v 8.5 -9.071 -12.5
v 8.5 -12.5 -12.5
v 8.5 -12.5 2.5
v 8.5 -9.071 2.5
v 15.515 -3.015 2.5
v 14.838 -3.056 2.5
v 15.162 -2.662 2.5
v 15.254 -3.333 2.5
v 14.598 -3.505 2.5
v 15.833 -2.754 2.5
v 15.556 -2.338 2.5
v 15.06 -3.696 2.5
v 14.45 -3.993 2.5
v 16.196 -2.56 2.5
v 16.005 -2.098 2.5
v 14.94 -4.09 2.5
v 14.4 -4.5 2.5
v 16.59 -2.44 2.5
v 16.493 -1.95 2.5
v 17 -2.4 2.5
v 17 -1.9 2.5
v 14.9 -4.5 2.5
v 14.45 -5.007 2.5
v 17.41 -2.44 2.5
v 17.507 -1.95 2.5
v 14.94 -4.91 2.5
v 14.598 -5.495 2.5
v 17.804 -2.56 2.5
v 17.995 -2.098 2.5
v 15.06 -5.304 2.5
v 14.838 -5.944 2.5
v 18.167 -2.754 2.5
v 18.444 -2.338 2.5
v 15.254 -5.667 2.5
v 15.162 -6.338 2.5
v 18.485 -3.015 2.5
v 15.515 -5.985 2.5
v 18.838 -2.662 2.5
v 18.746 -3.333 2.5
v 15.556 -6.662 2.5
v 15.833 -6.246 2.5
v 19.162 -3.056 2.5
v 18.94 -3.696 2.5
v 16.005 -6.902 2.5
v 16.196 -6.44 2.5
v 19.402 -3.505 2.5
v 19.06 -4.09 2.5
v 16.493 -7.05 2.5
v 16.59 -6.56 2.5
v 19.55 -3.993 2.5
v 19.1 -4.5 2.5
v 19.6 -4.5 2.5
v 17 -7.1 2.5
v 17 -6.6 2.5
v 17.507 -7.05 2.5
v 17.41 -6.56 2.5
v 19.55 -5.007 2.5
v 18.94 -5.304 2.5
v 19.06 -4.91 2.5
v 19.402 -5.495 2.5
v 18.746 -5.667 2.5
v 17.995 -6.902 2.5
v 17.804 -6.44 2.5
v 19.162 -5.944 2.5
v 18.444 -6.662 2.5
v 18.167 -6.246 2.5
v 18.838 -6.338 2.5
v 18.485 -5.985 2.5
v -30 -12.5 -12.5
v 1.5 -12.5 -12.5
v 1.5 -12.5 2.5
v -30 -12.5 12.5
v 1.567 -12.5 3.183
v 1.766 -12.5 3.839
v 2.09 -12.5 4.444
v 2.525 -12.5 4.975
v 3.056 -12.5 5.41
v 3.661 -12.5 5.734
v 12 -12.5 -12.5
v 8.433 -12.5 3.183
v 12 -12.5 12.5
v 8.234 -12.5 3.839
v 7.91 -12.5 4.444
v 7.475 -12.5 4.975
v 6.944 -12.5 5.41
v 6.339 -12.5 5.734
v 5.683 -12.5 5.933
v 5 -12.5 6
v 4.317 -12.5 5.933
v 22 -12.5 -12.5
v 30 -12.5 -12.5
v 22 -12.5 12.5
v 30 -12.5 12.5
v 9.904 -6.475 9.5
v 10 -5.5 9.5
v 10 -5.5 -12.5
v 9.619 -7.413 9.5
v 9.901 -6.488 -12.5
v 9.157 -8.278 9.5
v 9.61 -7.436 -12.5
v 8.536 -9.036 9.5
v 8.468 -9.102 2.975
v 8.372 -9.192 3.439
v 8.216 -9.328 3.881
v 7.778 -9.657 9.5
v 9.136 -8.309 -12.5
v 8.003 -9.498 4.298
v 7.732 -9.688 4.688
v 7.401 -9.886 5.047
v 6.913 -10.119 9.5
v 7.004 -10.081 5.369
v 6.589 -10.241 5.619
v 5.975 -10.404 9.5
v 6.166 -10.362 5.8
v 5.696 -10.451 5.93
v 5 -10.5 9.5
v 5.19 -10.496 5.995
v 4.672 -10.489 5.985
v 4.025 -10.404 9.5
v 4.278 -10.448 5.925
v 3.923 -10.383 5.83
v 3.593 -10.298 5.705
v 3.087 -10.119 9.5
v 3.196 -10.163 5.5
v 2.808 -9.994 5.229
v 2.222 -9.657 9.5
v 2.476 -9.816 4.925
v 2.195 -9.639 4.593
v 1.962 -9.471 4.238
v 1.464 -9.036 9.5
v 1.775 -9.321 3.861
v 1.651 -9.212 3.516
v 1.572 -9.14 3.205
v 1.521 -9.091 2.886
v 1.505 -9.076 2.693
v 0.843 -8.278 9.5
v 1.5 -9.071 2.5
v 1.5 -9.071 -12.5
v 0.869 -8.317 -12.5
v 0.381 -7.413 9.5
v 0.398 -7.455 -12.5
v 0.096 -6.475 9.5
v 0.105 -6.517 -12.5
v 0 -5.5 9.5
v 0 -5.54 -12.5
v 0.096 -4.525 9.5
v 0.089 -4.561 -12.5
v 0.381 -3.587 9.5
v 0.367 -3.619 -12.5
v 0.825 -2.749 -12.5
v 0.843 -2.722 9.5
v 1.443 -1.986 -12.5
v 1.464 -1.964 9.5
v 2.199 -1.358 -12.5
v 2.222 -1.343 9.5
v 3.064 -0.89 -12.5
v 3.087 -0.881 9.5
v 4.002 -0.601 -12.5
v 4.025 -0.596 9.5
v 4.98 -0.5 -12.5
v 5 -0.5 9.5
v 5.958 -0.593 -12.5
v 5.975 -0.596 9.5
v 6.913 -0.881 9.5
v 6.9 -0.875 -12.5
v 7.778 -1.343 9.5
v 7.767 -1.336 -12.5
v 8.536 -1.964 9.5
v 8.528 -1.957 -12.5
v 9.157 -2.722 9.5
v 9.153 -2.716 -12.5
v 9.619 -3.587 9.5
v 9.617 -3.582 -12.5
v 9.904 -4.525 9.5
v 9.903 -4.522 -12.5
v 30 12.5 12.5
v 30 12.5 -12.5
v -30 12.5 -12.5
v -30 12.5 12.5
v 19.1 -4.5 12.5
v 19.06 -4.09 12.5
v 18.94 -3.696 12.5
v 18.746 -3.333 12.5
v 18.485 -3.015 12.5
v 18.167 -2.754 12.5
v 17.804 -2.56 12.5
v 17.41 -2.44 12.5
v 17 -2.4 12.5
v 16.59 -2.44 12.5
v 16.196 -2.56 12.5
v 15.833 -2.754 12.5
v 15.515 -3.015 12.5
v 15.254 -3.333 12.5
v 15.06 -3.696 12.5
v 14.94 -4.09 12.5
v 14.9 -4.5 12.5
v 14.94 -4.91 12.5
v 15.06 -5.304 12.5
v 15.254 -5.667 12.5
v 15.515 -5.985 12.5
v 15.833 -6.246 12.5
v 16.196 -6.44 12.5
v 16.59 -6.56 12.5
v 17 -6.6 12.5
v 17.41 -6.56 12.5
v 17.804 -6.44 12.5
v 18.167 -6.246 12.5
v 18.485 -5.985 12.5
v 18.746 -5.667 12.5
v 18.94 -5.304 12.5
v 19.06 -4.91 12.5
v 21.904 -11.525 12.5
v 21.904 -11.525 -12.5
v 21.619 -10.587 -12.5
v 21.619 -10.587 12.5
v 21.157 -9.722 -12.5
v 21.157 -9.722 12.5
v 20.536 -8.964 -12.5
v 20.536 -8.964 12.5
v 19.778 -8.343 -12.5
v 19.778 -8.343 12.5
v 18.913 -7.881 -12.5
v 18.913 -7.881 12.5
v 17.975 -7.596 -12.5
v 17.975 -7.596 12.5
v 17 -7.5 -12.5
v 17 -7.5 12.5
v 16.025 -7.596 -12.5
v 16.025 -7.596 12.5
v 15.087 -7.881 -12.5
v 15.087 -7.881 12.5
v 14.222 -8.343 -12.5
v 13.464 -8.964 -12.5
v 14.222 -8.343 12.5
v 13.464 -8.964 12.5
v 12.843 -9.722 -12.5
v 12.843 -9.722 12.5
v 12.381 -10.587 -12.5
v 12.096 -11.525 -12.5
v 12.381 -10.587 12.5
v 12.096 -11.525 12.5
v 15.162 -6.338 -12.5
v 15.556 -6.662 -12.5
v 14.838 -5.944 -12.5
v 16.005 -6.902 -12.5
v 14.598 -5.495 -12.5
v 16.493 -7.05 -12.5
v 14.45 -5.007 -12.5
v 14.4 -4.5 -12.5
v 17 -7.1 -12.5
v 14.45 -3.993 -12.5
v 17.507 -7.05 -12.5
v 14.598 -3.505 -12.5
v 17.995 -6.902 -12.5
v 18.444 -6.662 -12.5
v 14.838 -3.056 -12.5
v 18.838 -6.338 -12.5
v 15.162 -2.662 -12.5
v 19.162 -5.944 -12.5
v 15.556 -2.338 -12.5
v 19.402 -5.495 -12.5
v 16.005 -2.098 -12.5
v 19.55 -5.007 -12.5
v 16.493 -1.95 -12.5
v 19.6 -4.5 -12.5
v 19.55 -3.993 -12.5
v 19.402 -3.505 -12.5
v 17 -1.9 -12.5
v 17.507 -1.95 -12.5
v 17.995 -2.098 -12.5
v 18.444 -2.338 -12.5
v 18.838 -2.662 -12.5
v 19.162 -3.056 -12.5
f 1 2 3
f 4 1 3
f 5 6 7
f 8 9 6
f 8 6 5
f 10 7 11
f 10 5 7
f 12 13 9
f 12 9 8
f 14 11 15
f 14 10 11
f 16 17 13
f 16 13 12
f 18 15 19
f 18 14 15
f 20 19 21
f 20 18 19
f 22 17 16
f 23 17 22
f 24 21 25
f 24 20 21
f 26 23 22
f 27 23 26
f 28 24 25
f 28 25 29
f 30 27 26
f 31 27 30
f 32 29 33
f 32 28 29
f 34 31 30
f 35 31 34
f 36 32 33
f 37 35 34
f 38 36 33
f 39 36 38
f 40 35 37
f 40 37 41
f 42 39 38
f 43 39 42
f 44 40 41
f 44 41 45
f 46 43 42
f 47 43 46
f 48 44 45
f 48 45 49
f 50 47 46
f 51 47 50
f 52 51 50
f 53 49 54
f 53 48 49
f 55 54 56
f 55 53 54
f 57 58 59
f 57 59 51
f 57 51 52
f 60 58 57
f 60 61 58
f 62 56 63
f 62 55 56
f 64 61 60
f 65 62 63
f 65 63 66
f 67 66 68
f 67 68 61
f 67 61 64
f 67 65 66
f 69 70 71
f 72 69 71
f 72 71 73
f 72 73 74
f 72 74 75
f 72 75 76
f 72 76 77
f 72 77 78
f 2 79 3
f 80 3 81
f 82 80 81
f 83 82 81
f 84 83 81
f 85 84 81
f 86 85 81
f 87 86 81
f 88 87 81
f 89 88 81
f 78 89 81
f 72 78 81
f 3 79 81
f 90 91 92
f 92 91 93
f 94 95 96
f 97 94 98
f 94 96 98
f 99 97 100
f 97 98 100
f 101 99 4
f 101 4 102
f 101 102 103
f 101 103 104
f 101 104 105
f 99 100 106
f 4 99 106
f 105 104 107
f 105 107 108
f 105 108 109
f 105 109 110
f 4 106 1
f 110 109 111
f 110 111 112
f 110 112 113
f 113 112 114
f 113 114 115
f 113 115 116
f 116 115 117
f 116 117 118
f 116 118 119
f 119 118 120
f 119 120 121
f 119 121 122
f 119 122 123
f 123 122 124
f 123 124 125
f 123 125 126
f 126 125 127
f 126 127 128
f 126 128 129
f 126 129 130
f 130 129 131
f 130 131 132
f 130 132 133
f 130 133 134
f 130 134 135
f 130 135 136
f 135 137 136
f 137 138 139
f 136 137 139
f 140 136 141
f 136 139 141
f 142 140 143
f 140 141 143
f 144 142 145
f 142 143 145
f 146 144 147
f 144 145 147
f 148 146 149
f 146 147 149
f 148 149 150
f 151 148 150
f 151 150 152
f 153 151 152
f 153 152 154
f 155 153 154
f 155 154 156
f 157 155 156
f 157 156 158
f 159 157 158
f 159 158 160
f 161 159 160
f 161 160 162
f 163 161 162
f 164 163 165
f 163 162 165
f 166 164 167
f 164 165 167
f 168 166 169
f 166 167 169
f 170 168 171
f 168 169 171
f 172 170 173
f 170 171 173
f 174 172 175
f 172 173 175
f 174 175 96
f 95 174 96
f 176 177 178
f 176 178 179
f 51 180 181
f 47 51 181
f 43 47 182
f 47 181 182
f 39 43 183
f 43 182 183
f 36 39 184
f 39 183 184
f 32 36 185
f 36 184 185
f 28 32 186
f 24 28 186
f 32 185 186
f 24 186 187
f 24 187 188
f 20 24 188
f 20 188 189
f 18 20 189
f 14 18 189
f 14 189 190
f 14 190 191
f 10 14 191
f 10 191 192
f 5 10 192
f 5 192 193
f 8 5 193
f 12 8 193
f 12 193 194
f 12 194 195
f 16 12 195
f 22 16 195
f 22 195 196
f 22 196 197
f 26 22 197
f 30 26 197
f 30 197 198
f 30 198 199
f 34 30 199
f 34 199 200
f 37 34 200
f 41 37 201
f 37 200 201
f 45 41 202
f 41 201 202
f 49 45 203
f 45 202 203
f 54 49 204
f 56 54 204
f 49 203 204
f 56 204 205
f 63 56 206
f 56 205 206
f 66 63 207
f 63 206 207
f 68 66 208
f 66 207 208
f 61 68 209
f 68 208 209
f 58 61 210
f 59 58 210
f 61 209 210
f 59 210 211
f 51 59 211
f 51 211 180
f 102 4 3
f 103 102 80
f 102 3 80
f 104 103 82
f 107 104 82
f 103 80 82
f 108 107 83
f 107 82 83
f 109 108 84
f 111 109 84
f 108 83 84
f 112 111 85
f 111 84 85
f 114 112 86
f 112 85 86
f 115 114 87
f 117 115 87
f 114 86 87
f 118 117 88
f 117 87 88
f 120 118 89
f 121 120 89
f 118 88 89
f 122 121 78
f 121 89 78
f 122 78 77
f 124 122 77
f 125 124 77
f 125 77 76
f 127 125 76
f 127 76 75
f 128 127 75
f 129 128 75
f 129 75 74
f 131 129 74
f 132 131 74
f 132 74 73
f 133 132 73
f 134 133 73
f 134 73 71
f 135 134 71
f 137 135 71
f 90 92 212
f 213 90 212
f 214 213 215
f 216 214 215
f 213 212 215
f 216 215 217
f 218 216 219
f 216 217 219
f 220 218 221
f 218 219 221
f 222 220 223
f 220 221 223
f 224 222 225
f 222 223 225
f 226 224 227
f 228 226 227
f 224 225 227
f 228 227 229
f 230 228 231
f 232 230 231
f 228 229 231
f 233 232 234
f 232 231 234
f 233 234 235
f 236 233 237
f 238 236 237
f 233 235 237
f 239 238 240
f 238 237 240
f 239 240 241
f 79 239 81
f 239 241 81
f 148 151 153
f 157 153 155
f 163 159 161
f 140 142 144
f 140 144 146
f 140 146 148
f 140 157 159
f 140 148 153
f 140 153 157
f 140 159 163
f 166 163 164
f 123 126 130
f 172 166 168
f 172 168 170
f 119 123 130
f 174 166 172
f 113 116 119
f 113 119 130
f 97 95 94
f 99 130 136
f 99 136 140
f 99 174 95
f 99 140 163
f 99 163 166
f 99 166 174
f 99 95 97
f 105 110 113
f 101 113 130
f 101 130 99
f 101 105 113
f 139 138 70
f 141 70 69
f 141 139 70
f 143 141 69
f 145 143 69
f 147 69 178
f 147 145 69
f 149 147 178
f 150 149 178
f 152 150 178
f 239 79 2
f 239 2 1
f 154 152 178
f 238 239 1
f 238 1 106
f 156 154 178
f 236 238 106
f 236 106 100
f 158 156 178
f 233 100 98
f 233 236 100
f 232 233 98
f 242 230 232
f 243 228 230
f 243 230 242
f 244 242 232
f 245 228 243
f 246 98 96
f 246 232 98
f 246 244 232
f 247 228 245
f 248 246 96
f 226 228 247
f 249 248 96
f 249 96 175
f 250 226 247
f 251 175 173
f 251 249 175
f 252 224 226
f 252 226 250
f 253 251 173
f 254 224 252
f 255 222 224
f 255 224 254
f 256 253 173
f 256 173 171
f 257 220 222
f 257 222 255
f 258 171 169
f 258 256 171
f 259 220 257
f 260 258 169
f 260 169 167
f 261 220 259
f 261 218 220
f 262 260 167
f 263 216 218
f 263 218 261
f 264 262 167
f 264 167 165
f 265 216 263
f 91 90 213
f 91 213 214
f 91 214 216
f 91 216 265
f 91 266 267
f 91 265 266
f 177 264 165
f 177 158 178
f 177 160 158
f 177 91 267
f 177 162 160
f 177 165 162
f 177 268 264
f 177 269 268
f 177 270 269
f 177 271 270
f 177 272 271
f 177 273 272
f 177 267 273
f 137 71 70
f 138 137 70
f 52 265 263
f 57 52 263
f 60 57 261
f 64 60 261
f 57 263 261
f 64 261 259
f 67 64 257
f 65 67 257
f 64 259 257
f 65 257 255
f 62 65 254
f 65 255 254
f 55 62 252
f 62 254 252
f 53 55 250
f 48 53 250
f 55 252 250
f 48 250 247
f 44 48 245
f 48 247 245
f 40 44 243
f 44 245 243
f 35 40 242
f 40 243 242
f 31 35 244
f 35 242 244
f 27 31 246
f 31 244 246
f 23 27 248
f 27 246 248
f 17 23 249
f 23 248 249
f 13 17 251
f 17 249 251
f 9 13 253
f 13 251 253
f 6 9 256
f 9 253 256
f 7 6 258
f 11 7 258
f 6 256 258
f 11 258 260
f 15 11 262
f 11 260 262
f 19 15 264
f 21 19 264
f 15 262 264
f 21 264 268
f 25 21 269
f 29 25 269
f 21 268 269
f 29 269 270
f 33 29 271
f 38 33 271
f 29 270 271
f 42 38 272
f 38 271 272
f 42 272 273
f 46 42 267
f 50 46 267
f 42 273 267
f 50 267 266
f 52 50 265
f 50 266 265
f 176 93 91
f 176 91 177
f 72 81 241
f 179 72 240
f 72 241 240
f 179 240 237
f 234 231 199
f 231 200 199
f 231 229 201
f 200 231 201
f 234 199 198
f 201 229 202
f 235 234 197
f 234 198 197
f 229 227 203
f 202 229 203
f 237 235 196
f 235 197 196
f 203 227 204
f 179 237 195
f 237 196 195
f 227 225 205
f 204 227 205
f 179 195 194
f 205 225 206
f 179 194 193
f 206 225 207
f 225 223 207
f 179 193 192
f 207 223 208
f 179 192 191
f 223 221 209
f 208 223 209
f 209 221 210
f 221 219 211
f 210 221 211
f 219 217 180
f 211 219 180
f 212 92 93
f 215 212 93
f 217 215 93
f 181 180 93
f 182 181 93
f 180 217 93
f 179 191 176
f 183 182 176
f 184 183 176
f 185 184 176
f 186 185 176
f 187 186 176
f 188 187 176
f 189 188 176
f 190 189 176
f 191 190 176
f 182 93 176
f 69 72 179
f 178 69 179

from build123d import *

# Parameters (mm, degrees)
F0_W      = 25
F0_H      = 25
F1_DEPTH  = 30
F3_DEPTH  = 25.001
F4_R      = 2.1
F5_DEPTH  = 25.001
F6_R      = 5
F7_DEPTH  = 22
F9_DEPTH  = 7
F10_R     = 2.6
F11_DEPTH = 15


with BuildPart() as f1:
    # F0 (on Right) → F1 (new body, symmetric)
    with BuildSketch(Plane.YZ):
        Rectangle(F0_W, F0_H)
    extrude(amount=F1_DEPTH, both=True)

    # F2 (on face) → F3 (cut, through all)
    with BuildSketch(Plane.XY.offset(12.5)):
        with BuildLine():
            Line((12, -12.5), (22, -12.5))
            ThreePointArc((22, -12.5), (17, -7.5), (12, -12.5))
        make_face()
    extrude(amount=-F3_DEPTH, mode=Mode.SUBTRACT)

    # F4 (on face) → F5 (cut, through all)
    with BuildSketch(Plane.XY.offset(12.5)):
        with Locations((17, -4.5)):
            Circle(F4_R)
    extrude(amount=-F5_DEPTH, mode=Mode.SUBTRACT)

    # F6 (on face) → F7 (cut)
    with BuildSketch(Plane(origin=(0, 0, -12.5), x_dir=(1, 0, 0), z_dir=(0, 0, -1))):
        with Locations((5, 5.5)):
            Circle(F6_R)
    extrude(amount=-F7_DEPTH, mode=Mode.SUBTRACT)

    # F8 (on face) → F9 (cut)
    with BuildSketch(Plane.XZ.offset(12.5)):
        with BuildLine():
            Line((1.5, -12.5), (8.5, -12.5))
            Line((8.5, -12.5), (8.5, 2.5))
            ThreePointArc((8.5, 2.5), (5, 6), (1.5, 2.5))
            Line((1.5, 2.5), (1.5, -12.5))
        make_face()
    extrude(amount=-F9_DEPTH, mode=Mode.SUBTRACT)

    # F10 (on face) → F11 (cut)
    with BuildSketch(Plane(origin=(0, 0, -12.5), x_dir=(1, 0, 0), z_dir=(0, 0, -1))):
        with Locations((17, 4.5)):
            Circle(F10_R)
    extrude(amount=-F11_DEPTH, mode=Mode.SUBTRACT)


with BuildPart() as f12_1:
    # F12: copy of F1
    add(f1.part)


solid = f1.part
